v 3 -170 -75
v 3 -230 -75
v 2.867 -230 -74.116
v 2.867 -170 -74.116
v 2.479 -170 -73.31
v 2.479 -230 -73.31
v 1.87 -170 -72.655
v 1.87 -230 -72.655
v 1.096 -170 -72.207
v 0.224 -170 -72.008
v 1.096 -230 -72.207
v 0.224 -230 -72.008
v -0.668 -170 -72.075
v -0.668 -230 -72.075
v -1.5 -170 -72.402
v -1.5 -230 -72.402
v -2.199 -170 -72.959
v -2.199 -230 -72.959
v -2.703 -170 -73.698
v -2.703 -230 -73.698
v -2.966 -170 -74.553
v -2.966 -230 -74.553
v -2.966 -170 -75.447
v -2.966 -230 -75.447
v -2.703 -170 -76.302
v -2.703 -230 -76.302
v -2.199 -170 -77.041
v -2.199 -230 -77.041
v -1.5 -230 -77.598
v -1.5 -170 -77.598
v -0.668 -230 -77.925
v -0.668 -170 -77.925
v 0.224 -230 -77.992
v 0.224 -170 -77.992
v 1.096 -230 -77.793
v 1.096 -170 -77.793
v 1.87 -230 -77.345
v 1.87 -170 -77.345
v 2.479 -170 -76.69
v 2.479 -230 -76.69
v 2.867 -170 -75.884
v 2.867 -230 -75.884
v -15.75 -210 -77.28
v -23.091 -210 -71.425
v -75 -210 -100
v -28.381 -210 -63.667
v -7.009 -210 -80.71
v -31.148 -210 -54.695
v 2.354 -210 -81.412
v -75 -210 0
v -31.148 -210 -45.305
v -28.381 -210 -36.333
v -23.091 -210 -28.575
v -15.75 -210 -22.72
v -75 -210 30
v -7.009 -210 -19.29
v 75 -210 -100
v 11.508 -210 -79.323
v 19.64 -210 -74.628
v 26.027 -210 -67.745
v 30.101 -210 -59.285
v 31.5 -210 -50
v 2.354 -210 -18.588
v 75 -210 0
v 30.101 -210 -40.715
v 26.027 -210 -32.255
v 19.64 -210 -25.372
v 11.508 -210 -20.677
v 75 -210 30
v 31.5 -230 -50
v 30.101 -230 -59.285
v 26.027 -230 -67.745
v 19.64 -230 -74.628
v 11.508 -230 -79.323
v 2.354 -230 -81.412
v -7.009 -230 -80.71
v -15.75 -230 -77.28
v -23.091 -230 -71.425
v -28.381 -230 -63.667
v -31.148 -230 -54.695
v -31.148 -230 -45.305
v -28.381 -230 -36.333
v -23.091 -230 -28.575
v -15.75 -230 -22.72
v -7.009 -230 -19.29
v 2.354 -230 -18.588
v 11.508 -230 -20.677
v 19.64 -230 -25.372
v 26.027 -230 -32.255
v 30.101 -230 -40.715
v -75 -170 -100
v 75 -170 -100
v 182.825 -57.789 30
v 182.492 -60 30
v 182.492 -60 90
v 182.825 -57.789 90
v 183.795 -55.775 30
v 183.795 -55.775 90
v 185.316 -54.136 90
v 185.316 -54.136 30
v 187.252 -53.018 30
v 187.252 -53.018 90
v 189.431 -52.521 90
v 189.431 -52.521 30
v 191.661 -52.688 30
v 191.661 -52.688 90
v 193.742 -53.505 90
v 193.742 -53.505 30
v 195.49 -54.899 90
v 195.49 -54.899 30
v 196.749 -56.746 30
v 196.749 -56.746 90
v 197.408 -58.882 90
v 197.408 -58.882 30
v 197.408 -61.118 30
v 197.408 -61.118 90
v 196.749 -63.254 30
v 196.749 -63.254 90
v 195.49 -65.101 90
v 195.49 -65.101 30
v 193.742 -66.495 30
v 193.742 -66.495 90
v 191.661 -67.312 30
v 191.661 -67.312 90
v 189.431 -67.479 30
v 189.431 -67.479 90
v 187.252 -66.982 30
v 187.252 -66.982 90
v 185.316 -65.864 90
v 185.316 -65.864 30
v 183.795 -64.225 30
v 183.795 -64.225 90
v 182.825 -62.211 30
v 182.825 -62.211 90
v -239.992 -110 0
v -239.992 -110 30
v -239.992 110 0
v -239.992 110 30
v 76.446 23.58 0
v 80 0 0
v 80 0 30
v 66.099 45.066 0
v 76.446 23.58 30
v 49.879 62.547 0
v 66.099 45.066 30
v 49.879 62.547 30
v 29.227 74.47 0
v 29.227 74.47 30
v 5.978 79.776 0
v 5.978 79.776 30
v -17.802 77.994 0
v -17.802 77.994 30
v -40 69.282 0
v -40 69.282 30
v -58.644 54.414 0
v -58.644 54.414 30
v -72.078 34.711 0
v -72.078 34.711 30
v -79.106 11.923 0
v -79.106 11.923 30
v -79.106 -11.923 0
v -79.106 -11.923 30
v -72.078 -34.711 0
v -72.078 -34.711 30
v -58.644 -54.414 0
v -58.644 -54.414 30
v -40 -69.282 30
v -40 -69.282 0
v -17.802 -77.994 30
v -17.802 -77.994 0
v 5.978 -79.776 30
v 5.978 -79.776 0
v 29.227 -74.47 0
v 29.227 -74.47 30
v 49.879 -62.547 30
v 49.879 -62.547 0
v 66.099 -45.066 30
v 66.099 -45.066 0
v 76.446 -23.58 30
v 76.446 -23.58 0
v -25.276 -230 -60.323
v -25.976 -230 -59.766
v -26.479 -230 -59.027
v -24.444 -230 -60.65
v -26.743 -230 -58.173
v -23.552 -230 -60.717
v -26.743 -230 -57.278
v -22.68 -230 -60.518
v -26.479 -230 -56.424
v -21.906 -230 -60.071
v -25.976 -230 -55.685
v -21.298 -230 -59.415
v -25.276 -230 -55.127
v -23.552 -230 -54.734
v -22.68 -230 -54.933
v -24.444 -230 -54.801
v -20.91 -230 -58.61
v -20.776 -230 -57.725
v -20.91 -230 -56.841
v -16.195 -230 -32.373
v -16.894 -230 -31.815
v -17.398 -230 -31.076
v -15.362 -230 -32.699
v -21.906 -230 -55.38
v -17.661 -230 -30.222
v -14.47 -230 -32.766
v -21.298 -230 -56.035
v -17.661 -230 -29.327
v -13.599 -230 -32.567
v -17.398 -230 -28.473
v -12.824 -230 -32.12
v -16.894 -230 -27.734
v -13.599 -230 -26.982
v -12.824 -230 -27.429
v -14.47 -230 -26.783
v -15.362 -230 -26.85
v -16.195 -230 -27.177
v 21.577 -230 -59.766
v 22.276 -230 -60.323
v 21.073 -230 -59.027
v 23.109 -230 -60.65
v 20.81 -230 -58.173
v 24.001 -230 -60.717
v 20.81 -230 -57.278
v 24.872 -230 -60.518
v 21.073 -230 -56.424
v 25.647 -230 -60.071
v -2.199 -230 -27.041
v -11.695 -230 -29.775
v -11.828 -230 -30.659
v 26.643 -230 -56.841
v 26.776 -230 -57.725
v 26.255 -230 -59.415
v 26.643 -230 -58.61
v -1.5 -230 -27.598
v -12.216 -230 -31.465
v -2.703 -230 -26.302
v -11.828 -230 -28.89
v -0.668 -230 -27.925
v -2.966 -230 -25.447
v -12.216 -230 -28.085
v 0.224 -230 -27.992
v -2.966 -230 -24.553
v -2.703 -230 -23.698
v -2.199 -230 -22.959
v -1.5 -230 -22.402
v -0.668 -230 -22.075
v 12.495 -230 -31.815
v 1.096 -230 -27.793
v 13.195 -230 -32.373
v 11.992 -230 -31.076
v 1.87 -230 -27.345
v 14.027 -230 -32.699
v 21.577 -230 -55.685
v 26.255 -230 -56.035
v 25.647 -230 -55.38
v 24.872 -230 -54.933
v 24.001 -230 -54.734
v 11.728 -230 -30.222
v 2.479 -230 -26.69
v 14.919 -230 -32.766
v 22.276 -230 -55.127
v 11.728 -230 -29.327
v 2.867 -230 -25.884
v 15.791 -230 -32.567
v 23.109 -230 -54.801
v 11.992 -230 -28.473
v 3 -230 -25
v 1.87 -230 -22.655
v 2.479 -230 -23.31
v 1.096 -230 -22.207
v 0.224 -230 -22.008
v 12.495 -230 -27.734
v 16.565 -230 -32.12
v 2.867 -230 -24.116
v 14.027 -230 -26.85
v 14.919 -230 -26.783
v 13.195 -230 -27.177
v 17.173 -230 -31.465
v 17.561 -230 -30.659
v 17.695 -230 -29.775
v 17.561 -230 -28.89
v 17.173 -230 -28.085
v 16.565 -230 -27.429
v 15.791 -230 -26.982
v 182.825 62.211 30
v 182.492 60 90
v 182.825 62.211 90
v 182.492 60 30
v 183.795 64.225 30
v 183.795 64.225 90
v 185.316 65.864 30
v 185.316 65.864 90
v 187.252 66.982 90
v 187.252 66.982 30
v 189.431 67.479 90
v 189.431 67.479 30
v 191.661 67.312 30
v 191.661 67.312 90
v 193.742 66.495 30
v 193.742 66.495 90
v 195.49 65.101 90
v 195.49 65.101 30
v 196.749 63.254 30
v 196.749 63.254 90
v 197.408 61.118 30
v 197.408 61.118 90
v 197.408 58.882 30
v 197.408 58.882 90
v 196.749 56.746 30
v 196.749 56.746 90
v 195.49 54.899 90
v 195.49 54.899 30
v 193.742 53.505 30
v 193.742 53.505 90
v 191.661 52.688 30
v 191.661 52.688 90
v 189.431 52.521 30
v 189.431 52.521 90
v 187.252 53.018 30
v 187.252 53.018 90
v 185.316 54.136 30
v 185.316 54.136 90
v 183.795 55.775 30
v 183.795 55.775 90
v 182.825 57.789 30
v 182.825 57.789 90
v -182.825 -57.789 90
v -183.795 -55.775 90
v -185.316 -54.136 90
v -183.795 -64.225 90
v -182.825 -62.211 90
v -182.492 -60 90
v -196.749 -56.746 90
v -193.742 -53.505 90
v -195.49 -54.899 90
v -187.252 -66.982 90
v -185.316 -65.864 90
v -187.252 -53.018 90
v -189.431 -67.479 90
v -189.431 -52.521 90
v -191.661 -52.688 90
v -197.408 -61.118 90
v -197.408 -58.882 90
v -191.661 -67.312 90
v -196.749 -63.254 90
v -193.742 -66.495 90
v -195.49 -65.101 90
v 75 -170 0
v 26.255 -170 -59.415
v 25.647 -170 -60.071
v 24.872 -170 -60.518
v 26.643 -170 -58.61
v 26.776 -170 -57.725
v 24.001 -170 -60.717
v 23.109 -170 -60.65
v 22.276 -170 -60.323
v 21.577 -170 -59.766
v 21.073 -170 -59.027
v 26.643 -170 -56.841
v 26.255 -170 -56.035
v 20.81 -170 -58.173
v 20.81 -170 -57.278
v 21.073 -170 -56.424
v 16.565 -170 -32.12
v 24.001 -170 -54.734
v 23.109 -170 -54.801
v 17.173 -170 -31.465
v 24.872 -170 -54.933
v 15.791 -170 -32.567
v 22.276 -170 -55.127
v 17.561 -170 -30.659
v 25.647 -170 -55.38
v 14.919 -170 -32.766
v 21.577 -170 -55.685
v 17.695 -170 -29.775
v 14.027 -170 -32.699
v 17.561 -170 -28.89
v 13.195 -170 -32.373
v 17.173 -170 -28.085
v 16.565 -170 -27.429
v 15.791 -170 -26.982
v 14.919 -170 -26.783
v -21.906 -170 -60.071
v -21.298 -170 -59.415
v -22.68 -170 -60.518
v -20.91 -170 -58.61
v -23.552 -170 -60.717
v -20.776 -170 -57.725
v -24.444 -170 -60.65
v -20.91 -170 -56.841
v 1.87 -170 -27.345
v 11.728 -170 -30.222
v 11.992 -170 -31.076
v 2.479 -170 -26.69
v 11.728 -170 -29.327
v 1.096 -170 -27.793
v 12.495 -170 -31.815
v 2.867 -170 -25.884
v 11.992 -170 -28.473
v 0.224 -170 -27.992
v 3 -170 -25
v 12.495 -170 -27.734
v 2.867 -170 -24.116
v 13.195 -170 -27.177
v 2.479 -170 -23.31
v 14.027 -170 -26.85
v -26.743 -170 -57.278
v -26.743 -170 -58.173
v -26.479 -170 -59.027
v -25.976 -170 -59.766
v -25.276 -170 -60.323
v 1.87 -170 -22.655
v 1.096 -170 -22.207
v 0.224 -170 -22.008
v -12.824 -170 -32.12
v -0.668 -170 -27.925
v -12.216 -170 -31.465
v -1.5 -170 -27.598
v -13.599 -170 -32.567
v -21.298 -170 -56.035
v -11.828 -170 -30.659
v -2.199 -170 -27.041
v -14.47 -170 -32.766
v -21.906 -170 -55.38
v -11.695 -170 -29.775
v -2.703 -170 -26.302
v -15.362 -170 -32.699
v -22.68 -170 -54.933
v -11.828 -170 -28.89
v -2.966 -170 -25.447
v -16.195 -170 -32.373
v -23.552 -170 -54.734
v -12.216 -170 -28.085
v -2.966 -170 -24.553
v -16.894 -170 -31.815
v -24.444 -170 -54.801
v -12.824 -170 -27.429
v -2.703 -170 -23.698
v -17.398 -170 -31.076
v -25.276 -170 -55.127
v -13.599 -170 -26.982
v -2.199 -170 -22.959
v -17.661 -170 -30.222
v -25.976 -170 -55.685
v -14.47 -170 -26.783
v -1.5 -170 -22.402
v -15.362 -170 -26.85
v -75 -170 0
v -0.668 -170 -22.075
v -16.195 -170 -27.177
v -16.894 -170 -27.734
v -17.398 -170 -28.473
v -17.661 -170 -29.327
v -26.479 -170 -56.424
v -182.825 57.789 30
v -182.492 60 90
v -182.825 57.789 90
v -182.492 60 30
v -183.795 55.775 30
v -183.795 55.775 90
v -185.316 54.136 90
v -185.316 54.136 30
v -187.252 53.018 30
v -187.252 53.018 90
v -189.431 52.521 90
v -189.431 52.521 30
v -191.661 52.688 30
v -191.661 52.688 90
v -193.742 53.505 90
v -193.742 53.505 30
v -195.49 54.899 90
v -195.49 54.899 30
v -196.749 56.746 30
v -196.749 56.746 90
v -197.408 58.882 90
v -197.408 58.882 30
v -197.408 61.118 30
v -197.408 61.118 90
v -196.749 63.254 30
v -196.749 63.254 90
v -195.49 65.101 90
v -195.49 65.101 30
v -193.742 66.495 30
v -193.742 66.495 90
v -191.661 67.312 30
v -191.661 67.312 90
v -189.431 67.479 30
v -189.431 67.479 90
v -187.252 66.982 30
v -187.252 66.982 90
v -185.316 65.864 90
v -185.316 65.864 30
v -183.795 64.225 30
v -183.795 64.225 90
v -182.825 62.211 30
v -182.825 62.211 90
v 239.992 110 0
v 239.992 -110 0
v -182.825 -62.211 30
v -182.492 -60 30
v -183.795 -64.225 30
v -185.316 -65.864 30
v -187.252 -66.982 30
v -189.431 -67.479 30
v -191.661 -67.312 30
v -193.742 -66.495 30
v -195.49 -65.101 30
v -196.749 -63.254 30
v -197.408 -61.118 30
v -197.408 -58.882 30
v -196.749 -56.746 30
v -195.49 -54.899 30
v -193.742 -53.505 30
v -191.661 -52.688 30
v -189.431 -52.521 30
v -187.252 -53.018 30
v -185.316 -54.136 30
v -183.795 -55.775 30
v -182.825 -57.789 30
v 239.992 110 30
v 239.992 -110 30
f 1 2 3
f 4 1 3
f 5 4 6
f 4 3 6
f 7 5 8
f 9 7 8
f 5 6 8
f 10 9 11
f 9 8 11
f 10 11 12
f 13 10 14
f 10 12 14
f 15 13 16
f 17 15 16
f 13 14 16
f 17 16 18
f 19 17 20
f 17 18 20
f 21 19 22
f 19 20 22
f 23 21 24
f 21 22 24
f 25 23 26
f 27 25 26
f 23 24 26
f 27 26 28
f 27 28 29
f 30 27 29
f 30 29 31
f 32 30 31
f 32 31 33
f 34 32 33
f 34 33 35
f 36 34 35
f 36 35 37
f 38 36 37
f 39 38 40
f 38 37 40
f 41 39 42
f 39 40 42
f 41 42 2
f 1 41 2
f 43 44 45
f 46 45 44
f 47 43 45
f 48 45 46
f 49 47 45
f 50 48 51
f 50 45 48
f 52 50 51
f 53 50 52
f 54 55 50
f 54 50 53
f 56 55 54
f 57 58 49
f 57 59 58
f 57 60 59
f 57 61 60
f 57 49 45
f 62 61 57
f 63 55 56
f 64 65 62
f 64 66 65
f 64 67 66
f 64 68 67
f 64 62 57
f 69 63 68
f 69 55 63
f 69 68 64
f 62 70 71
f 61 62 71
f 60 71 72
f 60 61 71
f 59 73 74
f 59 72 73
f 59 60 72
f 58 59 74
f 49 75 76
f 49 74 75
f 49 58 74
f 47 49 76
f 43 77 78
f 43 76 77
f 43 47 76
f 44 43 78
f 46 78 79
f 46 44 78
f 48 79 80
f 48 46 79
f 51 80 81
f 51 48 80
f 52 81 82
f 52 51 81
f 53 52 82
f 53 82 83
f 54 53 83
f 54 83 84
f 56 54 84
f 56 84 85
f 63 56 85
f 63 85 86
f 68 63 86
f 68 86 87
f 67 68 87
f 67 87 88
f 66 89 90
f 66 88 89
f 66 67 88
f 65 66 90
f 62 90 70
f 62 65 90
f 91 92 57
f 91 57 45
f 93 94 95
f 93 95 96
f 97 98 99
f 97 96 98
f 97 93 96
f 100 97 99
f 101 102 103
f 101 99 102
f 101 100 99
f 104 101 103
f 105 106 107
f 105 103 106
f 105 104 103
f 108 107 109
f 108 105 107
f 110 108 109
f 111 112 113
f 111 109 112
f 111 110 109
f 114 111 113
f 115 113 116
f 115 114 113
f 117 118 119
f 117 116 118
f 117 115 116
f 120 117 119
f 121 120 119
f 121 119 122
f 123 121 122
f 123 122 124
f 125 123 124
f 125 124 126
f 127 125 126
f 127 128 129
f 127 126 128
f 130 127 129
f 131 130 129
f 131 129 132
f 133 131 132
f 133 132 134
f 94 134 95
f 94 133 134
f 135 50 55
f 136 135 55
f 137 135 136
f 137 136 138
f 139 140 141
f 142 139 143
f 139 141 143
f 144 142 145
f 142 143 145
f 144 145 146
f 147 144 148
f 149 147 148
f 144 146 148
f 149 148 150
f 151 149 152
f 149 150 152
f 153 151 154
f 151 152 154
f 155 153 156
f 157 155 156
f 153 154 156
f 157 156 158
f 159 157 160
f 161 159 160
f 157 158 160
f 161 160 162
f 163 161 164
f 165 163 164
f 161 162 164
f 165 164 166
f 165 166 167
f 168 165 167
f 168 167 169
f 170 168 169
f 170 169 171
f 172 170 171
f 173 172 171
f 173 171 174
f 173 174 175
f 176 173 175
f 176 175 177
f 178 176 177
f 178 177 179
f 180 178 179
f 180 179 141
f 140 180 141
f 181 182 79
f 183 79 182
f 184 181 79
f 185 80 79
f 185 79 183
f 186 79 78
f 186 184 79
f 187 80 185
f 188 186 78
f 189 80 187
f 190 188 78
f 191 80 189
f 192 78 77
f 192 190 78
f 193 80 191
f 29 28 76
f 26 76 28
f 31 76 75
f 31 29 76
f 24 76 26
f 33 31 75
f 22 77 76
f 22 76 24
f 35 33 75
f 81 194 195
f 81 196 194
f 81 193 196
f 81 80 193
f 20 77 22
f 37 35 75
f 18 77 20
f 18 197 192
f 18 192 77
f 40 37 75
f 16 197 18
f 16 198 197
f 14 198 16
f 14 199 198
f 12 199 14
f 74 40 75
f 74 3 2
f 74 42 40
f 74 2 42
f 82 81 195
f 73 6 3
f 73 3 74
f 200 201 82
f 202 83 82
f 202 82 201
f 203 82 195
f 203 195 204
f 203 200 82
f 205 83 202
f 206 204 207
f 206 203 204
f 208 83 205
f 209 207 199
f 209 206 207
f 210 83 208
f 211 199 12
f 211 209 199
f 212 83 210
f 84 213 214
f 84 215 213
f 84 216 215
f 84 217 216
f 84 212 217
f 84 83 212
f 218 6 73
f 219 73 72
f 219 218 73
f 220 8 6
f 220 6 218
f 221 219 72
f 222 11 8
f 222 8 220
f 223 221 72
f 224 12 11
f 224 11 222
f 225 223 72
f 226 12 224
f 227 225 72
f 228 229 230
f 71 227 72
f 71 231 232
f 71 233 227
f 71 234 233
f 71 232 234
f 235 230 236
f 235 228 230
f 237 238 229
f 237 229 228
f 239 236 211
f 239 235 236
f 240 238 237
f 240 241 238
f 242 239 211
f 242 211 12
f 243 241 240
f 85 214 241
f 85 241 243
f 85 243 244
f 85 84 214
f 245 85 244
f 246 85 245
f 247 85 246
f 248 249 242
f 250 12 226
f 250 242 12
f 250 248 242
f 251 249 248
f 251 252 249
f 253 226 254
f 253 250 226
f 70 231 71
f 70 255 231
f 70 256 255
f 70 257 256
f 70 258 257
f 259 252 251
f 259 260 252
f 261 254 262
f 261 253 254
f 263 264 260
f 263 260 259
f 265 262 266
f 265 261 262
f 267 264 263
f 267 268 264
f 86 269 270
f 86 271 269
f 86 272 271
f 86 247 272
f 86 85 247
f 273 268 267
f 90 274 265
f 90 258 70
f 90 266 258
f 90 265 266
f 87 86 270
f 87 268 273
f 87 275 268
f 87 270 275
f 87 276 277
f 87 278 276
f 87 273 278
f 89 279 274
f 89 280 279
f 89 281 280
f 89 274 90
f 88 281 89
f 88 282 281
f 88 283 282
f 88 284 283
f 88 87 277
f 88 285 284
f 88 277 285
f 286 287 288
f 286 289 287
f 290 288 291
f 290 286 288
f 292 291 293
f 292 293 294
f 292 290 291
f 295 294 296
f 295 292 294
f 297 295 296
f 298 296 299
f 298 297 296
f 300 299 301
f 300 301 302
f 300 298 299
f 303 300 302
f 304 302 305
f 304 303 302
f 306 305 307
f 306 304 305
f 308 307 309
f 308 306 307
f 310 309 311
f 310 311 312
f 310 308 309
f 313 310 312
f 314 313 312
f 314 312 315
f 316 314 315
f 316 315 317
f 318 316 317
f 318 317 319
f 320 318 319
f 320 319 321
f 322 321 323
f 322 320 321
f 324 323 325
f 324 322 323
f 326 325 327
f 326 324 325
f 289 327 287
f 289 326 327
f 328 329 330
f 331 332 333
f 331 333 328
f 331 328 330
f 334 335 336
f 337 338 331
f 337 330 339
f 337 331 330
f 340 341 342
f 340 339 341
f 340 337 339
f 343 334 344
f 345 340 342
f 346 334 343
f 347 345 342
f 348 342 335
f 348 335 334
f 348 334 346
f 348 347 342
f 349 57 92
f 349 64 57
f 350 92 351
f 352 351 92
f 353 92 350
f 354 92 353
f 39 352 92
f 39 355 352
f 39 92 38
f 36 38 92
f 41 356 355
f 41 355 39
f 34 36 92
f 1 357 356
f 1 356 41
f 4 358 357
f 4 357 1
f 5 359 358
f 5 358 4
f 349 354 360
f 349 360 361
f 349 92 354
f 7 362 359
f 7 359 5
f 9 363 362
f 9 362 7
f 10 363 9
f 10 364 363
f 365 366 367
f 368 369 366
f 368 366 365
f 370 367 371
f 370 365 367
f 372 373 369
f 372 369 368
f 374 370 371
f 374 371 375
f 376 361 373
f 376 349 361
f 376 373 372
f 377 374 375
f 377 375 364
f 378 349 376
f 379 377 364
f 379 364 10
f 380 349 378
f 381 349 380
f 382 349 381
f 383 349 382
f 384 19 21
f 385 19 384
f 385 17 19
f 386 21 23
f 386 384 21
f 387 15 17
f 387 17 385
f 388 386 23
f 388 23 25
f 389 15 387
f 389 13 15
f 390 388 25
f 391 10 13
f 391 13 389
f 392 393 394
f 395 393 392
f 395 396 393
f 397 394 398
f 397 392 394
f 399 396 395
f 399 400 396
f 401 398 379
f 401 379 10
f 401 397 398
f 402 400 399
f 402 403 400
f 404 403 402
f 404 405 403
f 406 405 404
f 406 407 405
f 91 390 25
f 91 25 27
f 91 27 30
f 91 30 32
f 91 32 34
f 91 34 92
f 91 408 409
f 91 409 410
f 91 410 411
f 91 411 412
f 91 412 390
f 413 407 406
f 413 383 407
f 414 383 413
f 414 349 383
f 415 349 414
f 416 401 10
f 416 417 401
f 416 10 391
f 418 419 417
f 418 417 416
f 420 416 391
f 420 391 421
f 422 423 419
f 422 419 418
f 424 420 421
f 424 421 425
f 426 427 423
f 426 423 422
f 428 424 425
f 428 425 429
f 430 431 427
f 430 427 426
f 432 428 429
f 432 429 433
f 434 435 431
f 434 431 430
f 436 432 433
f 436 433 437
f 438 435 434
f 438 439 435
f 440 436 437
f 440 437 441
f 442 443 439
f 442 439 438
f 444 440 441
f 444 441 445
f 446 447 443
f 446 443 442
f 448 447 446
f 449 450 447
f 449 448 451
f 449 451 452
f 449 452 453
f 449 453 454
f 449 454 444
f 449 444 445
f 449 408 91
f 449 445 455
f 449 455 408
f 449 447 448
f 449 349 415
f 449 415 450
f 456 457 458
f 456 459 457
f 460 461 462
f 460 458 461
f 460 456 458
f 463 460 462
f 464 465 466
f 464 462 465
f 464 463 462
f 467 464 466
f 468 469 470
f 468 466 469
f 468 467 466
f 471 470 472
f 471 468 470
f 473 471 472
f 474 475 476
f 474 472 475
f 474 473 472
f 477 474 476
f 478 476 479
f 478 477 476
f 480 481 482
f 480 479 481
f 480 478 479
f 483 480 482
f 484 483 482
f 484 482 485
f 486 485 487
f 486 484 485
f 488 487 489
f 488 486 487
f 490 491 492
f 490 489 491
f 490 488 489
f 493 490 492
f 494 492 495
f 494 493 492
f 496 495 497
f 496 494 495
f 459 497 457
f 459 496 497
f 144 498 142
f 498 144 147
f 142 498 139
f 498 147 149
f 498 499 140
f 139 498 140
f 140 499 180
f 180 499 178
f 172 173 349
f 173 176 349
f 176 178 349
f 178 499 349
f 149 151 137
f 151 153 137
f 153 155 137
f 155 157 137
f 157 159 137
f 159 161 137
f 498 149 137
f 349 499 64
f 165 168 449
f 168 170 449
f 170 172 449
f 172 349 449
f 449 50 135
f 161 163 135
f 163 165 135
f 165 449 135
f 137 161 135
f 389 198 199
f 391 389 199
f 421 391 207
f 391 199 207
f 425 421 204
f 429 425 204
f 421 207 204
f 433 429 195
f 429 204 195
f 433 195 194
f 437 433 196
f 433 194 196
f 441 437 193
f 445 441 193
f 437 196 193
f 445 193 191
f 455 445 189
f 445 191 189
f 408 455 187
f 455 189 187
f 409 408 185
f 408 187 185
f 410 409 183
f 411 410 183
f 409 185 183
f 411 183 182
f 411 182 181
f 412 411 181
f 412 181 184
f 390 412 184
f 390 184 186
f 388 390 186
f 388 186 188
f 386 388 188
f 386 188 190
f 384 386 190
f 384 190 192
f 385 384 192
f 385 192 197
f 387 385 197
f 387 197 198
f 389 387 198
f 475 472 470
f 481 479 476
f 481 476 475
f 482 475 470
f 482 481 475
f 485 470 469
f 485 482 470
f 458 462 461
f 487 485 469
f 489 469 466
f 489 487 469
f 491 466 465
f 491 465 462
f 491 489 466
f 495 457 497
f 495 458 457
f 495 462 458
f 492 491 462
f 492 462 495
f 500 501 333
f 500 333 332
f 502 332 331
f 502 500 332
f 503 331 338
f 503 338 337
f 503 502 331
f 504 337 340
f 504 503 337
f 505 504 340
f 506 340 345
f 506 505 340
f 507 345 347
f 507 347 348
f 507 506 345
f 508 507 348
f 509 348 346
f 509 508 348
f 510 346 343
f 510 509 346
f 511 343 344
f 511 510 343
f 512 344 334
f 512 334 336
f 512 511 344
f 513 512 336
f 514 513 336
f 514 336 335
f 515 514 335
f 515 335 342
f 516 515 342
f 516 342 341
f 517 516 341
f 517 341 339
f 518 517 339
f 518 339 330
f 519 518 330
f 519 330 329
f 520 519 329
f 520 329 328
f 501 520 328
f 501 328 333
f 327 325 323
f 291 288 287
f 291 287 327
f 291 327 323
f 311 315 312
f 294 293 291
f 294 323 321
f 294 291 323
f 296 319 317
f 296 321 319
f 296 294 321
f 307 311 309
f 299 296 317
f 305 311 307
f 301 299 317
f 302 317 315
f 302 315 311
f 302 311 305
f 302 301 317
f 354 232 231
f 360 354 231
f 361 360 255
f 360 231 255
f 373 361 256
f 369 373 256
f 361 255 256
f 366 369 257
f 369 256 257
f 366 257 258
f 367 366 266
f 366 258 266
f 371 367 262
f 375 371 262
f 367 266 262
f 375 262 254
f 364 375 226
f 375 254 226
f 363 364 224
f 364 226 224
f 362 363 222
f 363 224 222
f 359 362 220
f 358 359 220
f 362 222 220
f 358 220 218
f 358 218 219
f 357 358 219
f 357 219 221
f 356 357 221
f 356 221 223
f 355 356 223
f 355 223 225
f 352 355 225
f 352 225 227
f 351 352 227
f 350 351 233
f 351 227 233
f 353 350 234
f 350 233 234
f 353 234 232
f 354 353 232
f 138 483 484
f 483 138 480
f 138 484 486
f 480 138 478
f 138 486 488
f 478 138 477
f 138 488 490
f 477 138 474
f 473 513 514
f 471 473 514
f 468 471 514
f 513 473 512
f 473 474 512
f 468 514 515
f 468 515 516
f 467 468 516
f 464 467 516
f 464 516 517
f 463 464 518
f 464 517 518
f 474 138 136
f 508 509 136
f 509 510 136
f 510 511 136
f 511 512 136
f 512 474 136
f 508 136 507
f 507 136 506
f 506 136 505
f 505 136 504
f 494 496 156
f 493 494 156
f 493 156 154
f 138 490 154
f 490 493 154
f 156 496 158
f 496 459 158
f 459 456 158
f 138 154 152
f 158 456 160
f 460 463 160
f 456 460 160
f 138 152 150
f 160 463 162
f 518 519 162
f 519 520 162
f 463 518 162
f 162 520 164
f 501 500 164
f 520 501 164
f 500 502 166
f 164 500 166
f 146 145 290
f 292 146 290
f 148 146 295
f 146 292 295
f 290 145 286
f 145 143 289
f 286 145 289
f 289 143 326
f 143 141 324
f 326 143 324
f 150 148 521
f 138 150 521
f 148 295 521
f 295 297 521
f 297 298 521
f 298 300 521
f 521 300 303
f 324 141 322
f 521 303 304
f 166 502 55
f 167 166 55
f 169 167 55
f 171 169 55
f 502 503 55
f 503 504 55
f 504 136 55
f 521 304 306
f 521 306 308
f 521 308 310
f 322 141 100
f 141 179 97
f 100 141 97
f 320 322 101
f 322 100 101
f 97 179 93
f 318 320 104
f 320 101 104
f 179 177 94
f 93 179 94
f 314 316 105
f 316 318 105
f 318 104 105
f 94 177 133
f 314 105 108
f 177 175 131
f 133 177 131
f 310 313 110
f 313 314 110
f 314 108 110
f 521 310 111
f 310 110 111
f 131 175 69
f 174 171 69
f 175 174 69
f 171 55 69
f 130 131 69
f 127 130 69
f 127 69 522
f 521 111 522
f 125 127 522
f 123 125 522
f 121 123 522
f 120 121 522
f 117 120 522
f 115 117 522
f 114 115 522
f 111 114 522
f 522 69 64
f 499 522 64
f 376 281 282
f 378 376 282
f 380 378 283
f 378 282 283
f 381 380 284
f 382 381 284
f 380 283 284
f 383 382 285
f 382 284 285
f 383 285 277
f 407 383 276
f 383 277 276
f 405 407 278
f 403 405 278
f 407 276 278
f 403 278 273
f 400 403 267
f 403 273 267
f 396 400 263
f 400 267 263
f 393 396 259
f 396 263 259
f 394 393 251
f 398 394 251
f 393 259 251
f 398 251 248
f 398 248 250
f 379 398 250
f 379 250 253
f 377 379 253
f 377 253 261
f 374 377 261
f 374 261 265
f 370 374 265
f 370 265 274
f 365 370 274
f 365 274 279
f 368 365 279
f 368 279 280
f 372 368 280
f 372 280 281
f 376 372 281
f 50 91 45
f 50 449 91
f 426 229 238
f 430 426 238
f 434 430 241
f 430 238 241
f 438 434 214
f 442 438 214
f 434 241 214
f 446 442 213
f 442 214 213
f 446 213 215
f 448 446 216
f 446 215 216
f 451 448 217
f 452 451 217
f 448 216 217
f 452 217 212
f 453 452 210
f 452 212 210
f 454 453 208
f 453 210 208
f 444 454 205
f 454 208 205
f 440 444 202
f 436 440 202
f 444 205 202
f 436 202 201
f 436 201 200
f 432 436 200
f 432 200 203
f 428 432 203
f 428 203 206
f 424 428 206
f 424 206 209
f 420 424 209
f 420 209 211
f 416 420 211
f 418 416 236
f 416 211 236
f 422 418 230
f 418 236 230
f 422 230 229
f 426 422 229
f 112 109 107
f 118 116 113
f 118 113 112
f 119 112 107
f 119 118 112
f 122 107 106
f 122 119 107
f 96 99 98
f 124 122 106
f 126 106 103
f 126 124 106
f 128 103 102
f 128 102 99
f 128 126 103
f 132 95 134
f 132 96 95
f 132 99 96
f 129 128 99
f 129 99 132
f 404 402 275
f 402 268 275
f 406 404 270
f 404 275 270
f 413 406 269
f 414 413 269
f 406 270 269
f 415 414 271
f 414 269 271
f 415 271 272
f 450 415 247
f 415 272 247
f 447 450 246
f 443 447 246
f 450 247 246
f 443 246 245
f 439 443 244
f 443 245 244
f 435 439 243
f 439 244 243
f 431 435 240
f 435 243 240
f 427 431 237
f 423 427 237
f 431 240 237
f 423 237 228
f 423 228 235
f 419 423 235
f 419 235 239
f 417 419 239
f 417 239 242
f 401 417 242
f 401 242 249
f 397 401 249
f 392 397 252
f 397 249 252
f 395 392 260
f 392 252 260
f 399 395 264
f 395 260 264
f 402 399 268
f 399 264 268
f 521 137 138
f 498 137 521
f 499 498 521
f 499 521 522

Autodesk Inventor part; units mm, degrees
ref_plane "YZ Plane" through (0, 0, 0) normal (1, 0, 0) x (0, 1, 0)
ref_plane "XZ Plane" through (0, 0, 0) normal (0, 1, 0) x (-1, 0, 0)
sketch "Boceto1" plane through (0, 0, 0) normal (0, 0, 1) x (1, 0, 0)
  circle A0 centre (0, 0) radius 264 construction
  line L0 (-239.9917, 110) -> (239.9917, 110)
  line L1 (239.9917, 110) -> (239.9917, -110)
  line L2 (239.9917, -110) -> (-239.9917, -110)
  line L3 (-239.9917, -110) -> (-239.9917, 110)
  line L4 (-239.9917, 110) -> (239.9917, -110) construction
  line L5 (239.9917, 110) -> (-239.9917, -110) construction
  dimension "d0" = 528
  dimension "d1" = 220
extrude "Extrusión1" add sketch "Boceto1" along normal blind 30
sketch "Boceto2" plane through (0, 0, 30) normal (0, 0, 1) x (1, 0, 0)
  circle A0 centre (-189.9917, 60) radius 7.5
  line L0 (239.9917, 110) -> (-239.9917, 110) construction
  line L1 (-239.9917, 110) -> (-239.9917, -110) construction
  point P0 (0, 0)
  dimension "d4" = 15
  dimension "d5" = 50
  dimension "d6" = 50
extrude "Extrusión2" add sketch "Boceto2" along normal blind 60
mirror "Simetría1" about plane through (0, 0, 0) normal (1, 0, 0) of "Extrusión2"
mirror "Simetría2" about plane through (0, 0, 0) normal (0, 1, 0) of "Extrusión2", "Simetría1"
sketch "Boceto3" plane through (0, 0, 30) normal (0, 0, 1) x (1, 0, 0)
  circle A0 centre (0, 0) radius 80
  dimension "d17" = 160
extrude "Extrusión3" cut sketch "Boceto3" along normal through all both and the other way through all
sketch "Boceto9" plane through (-239.9917, -110, 0) normal (0, -1, 0) x (1, 0, 0)
  line L0 (0, 30) -> (479.9833, 30) projected
  line L1 (479.9833, 0) -> (0, 0) projected
  line L2 (0, 30) -> (479.9833, 30)
  line L3 (479.9833, 30) -> (479.9833, 0)
  line L4 (479.9833, 0) -> (0, 0)
  line L5 (0, 0) -> (0, 30)
  point P0 (239.9917, 0)
ref_plane "Plano de trabajo1" through (-239.9917, -210, 0) normal (0, -1, 0) x (1, 0, 0)
sketch "Boceto10" plane through (-239.9917, -210, 0) normal (0, -1, 0) x (1, 0, 0)
  line L0 (0, 0) -> (479.9833, 0) construction
  line L1 (479.9833, 0) -> (479.9833, 30) construction
  line L2 (0, 30) -> (479.9833, 30) construction
  line L3 (0, 0) -> (0, 30) construction
  line L4 (164.9917, 30) -> (314.9917, 30)
  line L5 (314.9917, 30) -> (314.9917, 0)
  line L6 (314.9917, 0) -> (164.9917, 0)
  line L7 (164.9917, 0) -> (164.9917, 30)
  point P0 (239.9917, 0)
  point P1 (239.9917, 30)
  dimension "d41" = 150
  dimension "d42" = 30
loft "Solevación1" add profiles "Boceto10" section 1 edges at (0, -110, 0) (239.9917, -110, 15) (0, -110, 30) (-239.9917, -110, 15)
sketch "Boceto11" plane through (0, 0, 0) normal (0, 0, -1) x (-1, 0, 0)
  line L0 (75, -210) -> (-75, -210)
  line L1 (-75, -210) -> (-75, -170)
  line L2 (-75, -170) -> (75, -170)
  line L3 (75, -170) -> (75, -210)
  line L4 (-75, -210) -> (75, -210) projected
  point P0 (0, 0)
  point P1 (0, -210)
  dimension "d48" = 150
  dimension "d49" = 40
extrude "Extrusión8" add sketch "Boceto11" along normal blind 100
sketch "Boceto12" plane through (-75, -210, 30) normal (0, -1, 0) x (1, 0, 0)
  line L0 (150, -130) -> (0, -130) construction
  line L1 (0, -30) -> (0, 0) construction
  line L2 (150, -130) -> (0, -130) construction
  line L3 (0, -130) -> (0, -30) construction
  line L4 (0, -30) -> (150, -30) construction
  line L5 (150, -30) -> (150, -130) construction
  line L6 (150, 0) -> (150, -30) construction
  line L7 (150, -30) -> (0, -130) construction
  line L8 (0, -30) -> (150, -130) construction
  circle A0 centre (75, -80) radius 31.5
  point P0 (75, -30)
  dimension "d52" = 63
extrude "Extrusión9" add sketch "Boceto12" along normal blind 20
sketch "Boceto13" plane through (0, -230, -50) normal (0, -1, 0) x (1, 0, 0)
  circle A0 centre (0, 0) radius 25 construction
  circle A1 centre (0, 25) radius 3
  circle A2 centre (0, -25) radius 3
  circle A3 centre (23.7764, -7.7254) radius 3
  circle A4 centre (14.6946, 20.2254) radius 3
  circle A5 centre (-14.6946, 20.2254) radius 3
  circle A6 centre (-23.7764, -7.7254) radius 3
  point P0 (0, 50)
  dimension "d55" = 50
  dimension "d56" = 6
  dimension "d57" = 6
  dimension "d60" = 360
extrude "Extrusión10" cut sketch "Boceto13" against normal up to next
equation "\"d0\" = 0.8 * diametro_llanta"
equation "\"d1\" = 0.333333 * diametro_llanta"
equation "\"d2\" = espesor_soporte"
equation "\"d4\" = 0.5 * espesor_soporte"
equation "\"d7\" = 2 * espesor_soporte"
equation "\"d42\" = espesor_soporte"
equation "\"ancho_llanta\" = 271000"
equation "\"espesor_soporte\" = 30"
equation "\"diametro_llanta\" = 660"
properties part number "soporte" material "Acerito"
